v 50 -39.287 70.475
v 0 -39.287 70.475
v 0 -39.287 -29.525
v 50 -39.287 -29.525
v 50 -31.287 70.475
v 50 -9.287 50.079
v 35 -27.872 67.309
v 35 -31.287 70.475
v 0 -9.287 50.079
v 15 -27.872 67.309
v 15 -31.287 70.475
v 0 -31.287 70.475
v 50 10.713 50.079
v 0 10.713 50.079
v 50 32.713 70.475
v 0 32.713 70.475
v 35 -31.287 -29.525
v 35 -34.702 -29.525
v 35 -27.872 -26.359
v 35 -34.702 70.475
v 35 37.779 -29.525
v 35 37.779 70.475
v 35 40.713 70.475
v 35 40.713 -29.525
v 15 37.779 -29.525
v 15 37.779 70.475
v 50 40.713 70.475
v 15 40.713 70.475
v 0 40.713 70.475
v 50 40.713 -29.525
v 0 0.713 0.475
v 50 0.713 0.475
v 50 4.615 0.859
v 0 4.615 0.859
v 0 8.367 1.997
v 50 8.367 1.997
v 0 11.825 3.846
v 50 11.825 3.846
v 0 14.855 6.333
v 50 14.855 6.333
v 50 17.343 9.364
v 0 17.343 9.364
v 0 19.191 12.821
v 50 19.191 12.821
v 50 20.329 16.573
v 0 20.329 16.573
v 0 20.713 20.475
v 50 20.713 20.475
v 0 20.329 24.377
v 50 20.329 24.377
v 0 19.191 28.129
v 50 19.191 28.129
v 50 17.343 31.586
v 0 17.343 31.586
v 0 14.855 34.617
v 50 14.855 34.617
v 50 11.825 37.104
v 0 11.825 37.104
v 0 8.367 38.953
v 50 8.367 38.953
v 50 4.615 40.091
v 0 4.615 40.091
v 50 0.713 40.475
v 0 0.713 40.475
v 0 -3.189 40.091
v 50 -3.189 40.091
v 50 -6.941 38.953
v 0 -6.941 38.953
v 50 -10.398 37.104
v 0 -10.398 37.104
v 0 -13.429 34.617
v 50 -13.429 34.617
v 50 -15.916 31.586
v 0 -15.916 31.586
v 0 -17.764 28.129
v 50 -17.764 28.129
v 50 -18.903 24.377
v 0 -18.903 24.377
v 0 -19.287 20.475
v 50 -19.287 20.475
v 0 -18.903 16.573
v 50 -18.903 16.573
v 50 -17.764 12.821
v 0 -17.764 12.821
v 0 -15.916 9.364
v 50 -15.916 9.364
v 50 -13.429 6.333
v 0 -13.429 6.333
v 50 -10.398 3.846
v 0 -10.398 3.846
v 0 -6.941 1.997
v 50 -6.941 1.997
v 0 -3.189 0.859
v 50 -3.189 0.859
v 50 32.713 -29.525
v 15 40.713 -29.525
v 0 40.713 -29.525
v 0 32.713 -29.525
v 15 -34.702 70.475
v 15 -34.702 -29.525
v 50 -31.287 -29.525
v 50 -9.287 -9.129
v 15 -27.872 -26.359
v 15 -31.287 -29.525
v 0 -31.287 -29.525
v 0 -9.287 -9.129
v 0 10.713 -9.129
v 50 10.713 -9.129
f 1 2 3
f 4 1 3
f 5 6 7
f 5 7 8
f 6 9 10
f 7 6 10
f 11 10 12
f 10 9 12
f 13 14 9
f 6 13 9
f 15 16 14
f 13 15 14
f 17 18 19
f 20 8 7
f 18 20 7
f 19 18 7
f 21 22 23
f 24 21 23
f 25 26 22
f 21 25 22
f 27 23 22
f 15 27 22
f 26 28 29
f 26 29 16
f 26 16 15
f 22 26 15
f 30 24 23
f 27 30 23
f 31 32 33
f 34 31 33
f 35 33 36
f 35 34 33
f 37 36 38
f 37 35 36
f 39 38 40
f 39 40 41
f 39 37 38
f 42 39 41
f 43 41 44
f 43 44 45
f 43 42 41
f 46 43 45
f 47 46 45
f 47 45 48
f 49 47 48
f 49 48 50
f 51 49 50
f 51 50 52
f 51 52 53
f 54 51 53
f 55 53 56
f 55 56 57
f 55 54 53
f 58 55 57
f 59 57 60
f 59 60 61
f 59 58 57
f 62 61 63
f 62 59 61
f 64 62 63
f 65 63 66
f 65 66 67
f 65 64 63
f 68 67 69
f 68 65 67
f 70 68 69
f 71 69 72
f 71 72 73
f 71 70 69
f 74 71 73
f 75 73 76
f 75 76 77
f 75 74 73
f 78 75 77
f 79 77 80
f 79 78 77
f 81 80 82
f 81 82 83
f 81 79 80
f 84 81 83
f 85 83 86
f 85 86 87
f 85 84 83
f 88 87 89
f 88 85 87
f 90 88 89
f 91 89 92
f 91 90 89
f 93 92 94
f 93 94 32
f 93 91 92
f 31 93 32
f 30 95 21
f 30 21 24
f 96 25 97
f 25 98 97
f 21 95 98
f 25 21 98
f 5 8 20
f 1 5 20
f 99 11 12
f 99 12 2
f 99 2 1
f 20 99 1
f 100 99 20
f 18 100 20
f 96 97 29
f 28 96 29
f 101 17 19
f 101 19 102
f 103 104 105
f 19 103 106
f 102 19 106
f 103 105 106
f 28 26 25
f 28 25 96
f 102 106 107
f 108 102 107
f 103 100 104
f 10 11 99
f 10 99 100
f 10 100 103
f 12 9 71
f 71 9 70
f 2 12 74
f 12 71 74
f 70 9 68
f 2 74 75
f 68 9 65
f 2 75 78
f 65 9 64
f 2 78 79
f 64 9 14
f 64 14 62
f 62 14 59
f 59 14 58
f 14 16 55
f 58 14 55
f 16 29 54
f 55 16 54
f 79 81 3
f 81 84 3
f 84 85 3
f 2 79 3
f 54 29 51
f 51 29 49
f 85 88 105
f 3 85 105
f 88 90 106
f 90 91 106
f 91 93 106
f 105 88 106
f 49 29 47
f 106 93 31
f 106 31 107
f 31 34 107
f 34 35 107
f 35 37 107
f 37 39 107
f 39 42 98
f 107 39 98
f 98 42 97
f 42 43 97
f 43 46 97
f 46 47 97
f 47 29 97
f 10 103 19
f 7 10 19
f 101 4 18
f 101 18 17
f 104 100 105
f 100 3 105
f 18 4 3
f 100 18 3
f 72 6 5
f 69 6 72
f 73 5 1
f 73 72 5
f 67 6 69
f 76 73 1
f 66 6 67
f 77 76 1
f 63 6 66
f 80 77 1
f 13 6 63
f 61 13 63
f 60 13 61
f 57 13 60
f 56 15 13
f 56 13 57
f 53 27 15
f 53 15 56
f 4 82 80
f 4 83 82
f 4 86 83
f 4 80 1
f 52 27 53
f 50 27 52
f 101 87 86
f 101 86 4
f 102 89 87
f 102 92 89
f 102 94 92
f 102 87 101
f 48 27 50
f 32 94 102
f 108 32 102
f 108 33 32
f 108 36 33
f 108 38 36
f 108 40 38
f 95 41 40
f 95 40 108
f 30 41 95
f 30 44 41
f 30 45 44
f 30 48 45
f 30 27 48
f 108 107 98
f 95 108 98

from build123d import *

# Parameters (mm, degrees)
SKETCH1_R           = 20
BOSS_EXTRUDE1_DEPTH = 50
SKETCH2_W           = 20
SKETCH2_H           = 5.867462555
SKETCH2_H_2         = 6.829602609
CUT_EXTRUDE1_DEPTH  = 119.98554368


with BuildPart() as part:
    # Sketch1 → Boss-Extrude1 (new body)
    with BuildSketch(Plane(origin=(0, 0, 0), x_dir=(0, 0, -1), z_dir=(1, 0, 0))):
        Polygon((29.524911161, 40.713137988), (-70.475088839, 40.713137988), (-70.475088839, 32.713137988), (-50.079010784, 10.713137988), (-50.079010784, -9.286862012), (-70.475088839, -31.286862012), (-70.475088839, -39.286862012), (29.524911161, -39.286862012), (29.524911161, -31.286862012), (9.128833107, -9.286862012), (9.128833107, 10.713137988), (29.524911161, 32.713137988), align=None)
        with Locations((-20.475088839, 0.713137988)):
            Circle(SKETCH1_R, mode=Mode.SUBTRACT)
    extrude(amount=BOSS_EXTRUDE1_DEPTH)

    # Sketch2 → Cut-Extrude1 (cut, through all)
    with BuildSketch(Plane.XY.offset(70.475088839)):
        with Locations((25, 40.713137989)):
            Rectangle(SKETCH2_W, SKETCH2_H)
        with Locations((25, -31.286862012)):
            Rectangle(SKETCH2_W, SKETCH2_H_2)
    extrude(amount=-CUT_EXTRUDE1_DEPTH, mode=Mode.SUBTRACT)


solid = part.part
